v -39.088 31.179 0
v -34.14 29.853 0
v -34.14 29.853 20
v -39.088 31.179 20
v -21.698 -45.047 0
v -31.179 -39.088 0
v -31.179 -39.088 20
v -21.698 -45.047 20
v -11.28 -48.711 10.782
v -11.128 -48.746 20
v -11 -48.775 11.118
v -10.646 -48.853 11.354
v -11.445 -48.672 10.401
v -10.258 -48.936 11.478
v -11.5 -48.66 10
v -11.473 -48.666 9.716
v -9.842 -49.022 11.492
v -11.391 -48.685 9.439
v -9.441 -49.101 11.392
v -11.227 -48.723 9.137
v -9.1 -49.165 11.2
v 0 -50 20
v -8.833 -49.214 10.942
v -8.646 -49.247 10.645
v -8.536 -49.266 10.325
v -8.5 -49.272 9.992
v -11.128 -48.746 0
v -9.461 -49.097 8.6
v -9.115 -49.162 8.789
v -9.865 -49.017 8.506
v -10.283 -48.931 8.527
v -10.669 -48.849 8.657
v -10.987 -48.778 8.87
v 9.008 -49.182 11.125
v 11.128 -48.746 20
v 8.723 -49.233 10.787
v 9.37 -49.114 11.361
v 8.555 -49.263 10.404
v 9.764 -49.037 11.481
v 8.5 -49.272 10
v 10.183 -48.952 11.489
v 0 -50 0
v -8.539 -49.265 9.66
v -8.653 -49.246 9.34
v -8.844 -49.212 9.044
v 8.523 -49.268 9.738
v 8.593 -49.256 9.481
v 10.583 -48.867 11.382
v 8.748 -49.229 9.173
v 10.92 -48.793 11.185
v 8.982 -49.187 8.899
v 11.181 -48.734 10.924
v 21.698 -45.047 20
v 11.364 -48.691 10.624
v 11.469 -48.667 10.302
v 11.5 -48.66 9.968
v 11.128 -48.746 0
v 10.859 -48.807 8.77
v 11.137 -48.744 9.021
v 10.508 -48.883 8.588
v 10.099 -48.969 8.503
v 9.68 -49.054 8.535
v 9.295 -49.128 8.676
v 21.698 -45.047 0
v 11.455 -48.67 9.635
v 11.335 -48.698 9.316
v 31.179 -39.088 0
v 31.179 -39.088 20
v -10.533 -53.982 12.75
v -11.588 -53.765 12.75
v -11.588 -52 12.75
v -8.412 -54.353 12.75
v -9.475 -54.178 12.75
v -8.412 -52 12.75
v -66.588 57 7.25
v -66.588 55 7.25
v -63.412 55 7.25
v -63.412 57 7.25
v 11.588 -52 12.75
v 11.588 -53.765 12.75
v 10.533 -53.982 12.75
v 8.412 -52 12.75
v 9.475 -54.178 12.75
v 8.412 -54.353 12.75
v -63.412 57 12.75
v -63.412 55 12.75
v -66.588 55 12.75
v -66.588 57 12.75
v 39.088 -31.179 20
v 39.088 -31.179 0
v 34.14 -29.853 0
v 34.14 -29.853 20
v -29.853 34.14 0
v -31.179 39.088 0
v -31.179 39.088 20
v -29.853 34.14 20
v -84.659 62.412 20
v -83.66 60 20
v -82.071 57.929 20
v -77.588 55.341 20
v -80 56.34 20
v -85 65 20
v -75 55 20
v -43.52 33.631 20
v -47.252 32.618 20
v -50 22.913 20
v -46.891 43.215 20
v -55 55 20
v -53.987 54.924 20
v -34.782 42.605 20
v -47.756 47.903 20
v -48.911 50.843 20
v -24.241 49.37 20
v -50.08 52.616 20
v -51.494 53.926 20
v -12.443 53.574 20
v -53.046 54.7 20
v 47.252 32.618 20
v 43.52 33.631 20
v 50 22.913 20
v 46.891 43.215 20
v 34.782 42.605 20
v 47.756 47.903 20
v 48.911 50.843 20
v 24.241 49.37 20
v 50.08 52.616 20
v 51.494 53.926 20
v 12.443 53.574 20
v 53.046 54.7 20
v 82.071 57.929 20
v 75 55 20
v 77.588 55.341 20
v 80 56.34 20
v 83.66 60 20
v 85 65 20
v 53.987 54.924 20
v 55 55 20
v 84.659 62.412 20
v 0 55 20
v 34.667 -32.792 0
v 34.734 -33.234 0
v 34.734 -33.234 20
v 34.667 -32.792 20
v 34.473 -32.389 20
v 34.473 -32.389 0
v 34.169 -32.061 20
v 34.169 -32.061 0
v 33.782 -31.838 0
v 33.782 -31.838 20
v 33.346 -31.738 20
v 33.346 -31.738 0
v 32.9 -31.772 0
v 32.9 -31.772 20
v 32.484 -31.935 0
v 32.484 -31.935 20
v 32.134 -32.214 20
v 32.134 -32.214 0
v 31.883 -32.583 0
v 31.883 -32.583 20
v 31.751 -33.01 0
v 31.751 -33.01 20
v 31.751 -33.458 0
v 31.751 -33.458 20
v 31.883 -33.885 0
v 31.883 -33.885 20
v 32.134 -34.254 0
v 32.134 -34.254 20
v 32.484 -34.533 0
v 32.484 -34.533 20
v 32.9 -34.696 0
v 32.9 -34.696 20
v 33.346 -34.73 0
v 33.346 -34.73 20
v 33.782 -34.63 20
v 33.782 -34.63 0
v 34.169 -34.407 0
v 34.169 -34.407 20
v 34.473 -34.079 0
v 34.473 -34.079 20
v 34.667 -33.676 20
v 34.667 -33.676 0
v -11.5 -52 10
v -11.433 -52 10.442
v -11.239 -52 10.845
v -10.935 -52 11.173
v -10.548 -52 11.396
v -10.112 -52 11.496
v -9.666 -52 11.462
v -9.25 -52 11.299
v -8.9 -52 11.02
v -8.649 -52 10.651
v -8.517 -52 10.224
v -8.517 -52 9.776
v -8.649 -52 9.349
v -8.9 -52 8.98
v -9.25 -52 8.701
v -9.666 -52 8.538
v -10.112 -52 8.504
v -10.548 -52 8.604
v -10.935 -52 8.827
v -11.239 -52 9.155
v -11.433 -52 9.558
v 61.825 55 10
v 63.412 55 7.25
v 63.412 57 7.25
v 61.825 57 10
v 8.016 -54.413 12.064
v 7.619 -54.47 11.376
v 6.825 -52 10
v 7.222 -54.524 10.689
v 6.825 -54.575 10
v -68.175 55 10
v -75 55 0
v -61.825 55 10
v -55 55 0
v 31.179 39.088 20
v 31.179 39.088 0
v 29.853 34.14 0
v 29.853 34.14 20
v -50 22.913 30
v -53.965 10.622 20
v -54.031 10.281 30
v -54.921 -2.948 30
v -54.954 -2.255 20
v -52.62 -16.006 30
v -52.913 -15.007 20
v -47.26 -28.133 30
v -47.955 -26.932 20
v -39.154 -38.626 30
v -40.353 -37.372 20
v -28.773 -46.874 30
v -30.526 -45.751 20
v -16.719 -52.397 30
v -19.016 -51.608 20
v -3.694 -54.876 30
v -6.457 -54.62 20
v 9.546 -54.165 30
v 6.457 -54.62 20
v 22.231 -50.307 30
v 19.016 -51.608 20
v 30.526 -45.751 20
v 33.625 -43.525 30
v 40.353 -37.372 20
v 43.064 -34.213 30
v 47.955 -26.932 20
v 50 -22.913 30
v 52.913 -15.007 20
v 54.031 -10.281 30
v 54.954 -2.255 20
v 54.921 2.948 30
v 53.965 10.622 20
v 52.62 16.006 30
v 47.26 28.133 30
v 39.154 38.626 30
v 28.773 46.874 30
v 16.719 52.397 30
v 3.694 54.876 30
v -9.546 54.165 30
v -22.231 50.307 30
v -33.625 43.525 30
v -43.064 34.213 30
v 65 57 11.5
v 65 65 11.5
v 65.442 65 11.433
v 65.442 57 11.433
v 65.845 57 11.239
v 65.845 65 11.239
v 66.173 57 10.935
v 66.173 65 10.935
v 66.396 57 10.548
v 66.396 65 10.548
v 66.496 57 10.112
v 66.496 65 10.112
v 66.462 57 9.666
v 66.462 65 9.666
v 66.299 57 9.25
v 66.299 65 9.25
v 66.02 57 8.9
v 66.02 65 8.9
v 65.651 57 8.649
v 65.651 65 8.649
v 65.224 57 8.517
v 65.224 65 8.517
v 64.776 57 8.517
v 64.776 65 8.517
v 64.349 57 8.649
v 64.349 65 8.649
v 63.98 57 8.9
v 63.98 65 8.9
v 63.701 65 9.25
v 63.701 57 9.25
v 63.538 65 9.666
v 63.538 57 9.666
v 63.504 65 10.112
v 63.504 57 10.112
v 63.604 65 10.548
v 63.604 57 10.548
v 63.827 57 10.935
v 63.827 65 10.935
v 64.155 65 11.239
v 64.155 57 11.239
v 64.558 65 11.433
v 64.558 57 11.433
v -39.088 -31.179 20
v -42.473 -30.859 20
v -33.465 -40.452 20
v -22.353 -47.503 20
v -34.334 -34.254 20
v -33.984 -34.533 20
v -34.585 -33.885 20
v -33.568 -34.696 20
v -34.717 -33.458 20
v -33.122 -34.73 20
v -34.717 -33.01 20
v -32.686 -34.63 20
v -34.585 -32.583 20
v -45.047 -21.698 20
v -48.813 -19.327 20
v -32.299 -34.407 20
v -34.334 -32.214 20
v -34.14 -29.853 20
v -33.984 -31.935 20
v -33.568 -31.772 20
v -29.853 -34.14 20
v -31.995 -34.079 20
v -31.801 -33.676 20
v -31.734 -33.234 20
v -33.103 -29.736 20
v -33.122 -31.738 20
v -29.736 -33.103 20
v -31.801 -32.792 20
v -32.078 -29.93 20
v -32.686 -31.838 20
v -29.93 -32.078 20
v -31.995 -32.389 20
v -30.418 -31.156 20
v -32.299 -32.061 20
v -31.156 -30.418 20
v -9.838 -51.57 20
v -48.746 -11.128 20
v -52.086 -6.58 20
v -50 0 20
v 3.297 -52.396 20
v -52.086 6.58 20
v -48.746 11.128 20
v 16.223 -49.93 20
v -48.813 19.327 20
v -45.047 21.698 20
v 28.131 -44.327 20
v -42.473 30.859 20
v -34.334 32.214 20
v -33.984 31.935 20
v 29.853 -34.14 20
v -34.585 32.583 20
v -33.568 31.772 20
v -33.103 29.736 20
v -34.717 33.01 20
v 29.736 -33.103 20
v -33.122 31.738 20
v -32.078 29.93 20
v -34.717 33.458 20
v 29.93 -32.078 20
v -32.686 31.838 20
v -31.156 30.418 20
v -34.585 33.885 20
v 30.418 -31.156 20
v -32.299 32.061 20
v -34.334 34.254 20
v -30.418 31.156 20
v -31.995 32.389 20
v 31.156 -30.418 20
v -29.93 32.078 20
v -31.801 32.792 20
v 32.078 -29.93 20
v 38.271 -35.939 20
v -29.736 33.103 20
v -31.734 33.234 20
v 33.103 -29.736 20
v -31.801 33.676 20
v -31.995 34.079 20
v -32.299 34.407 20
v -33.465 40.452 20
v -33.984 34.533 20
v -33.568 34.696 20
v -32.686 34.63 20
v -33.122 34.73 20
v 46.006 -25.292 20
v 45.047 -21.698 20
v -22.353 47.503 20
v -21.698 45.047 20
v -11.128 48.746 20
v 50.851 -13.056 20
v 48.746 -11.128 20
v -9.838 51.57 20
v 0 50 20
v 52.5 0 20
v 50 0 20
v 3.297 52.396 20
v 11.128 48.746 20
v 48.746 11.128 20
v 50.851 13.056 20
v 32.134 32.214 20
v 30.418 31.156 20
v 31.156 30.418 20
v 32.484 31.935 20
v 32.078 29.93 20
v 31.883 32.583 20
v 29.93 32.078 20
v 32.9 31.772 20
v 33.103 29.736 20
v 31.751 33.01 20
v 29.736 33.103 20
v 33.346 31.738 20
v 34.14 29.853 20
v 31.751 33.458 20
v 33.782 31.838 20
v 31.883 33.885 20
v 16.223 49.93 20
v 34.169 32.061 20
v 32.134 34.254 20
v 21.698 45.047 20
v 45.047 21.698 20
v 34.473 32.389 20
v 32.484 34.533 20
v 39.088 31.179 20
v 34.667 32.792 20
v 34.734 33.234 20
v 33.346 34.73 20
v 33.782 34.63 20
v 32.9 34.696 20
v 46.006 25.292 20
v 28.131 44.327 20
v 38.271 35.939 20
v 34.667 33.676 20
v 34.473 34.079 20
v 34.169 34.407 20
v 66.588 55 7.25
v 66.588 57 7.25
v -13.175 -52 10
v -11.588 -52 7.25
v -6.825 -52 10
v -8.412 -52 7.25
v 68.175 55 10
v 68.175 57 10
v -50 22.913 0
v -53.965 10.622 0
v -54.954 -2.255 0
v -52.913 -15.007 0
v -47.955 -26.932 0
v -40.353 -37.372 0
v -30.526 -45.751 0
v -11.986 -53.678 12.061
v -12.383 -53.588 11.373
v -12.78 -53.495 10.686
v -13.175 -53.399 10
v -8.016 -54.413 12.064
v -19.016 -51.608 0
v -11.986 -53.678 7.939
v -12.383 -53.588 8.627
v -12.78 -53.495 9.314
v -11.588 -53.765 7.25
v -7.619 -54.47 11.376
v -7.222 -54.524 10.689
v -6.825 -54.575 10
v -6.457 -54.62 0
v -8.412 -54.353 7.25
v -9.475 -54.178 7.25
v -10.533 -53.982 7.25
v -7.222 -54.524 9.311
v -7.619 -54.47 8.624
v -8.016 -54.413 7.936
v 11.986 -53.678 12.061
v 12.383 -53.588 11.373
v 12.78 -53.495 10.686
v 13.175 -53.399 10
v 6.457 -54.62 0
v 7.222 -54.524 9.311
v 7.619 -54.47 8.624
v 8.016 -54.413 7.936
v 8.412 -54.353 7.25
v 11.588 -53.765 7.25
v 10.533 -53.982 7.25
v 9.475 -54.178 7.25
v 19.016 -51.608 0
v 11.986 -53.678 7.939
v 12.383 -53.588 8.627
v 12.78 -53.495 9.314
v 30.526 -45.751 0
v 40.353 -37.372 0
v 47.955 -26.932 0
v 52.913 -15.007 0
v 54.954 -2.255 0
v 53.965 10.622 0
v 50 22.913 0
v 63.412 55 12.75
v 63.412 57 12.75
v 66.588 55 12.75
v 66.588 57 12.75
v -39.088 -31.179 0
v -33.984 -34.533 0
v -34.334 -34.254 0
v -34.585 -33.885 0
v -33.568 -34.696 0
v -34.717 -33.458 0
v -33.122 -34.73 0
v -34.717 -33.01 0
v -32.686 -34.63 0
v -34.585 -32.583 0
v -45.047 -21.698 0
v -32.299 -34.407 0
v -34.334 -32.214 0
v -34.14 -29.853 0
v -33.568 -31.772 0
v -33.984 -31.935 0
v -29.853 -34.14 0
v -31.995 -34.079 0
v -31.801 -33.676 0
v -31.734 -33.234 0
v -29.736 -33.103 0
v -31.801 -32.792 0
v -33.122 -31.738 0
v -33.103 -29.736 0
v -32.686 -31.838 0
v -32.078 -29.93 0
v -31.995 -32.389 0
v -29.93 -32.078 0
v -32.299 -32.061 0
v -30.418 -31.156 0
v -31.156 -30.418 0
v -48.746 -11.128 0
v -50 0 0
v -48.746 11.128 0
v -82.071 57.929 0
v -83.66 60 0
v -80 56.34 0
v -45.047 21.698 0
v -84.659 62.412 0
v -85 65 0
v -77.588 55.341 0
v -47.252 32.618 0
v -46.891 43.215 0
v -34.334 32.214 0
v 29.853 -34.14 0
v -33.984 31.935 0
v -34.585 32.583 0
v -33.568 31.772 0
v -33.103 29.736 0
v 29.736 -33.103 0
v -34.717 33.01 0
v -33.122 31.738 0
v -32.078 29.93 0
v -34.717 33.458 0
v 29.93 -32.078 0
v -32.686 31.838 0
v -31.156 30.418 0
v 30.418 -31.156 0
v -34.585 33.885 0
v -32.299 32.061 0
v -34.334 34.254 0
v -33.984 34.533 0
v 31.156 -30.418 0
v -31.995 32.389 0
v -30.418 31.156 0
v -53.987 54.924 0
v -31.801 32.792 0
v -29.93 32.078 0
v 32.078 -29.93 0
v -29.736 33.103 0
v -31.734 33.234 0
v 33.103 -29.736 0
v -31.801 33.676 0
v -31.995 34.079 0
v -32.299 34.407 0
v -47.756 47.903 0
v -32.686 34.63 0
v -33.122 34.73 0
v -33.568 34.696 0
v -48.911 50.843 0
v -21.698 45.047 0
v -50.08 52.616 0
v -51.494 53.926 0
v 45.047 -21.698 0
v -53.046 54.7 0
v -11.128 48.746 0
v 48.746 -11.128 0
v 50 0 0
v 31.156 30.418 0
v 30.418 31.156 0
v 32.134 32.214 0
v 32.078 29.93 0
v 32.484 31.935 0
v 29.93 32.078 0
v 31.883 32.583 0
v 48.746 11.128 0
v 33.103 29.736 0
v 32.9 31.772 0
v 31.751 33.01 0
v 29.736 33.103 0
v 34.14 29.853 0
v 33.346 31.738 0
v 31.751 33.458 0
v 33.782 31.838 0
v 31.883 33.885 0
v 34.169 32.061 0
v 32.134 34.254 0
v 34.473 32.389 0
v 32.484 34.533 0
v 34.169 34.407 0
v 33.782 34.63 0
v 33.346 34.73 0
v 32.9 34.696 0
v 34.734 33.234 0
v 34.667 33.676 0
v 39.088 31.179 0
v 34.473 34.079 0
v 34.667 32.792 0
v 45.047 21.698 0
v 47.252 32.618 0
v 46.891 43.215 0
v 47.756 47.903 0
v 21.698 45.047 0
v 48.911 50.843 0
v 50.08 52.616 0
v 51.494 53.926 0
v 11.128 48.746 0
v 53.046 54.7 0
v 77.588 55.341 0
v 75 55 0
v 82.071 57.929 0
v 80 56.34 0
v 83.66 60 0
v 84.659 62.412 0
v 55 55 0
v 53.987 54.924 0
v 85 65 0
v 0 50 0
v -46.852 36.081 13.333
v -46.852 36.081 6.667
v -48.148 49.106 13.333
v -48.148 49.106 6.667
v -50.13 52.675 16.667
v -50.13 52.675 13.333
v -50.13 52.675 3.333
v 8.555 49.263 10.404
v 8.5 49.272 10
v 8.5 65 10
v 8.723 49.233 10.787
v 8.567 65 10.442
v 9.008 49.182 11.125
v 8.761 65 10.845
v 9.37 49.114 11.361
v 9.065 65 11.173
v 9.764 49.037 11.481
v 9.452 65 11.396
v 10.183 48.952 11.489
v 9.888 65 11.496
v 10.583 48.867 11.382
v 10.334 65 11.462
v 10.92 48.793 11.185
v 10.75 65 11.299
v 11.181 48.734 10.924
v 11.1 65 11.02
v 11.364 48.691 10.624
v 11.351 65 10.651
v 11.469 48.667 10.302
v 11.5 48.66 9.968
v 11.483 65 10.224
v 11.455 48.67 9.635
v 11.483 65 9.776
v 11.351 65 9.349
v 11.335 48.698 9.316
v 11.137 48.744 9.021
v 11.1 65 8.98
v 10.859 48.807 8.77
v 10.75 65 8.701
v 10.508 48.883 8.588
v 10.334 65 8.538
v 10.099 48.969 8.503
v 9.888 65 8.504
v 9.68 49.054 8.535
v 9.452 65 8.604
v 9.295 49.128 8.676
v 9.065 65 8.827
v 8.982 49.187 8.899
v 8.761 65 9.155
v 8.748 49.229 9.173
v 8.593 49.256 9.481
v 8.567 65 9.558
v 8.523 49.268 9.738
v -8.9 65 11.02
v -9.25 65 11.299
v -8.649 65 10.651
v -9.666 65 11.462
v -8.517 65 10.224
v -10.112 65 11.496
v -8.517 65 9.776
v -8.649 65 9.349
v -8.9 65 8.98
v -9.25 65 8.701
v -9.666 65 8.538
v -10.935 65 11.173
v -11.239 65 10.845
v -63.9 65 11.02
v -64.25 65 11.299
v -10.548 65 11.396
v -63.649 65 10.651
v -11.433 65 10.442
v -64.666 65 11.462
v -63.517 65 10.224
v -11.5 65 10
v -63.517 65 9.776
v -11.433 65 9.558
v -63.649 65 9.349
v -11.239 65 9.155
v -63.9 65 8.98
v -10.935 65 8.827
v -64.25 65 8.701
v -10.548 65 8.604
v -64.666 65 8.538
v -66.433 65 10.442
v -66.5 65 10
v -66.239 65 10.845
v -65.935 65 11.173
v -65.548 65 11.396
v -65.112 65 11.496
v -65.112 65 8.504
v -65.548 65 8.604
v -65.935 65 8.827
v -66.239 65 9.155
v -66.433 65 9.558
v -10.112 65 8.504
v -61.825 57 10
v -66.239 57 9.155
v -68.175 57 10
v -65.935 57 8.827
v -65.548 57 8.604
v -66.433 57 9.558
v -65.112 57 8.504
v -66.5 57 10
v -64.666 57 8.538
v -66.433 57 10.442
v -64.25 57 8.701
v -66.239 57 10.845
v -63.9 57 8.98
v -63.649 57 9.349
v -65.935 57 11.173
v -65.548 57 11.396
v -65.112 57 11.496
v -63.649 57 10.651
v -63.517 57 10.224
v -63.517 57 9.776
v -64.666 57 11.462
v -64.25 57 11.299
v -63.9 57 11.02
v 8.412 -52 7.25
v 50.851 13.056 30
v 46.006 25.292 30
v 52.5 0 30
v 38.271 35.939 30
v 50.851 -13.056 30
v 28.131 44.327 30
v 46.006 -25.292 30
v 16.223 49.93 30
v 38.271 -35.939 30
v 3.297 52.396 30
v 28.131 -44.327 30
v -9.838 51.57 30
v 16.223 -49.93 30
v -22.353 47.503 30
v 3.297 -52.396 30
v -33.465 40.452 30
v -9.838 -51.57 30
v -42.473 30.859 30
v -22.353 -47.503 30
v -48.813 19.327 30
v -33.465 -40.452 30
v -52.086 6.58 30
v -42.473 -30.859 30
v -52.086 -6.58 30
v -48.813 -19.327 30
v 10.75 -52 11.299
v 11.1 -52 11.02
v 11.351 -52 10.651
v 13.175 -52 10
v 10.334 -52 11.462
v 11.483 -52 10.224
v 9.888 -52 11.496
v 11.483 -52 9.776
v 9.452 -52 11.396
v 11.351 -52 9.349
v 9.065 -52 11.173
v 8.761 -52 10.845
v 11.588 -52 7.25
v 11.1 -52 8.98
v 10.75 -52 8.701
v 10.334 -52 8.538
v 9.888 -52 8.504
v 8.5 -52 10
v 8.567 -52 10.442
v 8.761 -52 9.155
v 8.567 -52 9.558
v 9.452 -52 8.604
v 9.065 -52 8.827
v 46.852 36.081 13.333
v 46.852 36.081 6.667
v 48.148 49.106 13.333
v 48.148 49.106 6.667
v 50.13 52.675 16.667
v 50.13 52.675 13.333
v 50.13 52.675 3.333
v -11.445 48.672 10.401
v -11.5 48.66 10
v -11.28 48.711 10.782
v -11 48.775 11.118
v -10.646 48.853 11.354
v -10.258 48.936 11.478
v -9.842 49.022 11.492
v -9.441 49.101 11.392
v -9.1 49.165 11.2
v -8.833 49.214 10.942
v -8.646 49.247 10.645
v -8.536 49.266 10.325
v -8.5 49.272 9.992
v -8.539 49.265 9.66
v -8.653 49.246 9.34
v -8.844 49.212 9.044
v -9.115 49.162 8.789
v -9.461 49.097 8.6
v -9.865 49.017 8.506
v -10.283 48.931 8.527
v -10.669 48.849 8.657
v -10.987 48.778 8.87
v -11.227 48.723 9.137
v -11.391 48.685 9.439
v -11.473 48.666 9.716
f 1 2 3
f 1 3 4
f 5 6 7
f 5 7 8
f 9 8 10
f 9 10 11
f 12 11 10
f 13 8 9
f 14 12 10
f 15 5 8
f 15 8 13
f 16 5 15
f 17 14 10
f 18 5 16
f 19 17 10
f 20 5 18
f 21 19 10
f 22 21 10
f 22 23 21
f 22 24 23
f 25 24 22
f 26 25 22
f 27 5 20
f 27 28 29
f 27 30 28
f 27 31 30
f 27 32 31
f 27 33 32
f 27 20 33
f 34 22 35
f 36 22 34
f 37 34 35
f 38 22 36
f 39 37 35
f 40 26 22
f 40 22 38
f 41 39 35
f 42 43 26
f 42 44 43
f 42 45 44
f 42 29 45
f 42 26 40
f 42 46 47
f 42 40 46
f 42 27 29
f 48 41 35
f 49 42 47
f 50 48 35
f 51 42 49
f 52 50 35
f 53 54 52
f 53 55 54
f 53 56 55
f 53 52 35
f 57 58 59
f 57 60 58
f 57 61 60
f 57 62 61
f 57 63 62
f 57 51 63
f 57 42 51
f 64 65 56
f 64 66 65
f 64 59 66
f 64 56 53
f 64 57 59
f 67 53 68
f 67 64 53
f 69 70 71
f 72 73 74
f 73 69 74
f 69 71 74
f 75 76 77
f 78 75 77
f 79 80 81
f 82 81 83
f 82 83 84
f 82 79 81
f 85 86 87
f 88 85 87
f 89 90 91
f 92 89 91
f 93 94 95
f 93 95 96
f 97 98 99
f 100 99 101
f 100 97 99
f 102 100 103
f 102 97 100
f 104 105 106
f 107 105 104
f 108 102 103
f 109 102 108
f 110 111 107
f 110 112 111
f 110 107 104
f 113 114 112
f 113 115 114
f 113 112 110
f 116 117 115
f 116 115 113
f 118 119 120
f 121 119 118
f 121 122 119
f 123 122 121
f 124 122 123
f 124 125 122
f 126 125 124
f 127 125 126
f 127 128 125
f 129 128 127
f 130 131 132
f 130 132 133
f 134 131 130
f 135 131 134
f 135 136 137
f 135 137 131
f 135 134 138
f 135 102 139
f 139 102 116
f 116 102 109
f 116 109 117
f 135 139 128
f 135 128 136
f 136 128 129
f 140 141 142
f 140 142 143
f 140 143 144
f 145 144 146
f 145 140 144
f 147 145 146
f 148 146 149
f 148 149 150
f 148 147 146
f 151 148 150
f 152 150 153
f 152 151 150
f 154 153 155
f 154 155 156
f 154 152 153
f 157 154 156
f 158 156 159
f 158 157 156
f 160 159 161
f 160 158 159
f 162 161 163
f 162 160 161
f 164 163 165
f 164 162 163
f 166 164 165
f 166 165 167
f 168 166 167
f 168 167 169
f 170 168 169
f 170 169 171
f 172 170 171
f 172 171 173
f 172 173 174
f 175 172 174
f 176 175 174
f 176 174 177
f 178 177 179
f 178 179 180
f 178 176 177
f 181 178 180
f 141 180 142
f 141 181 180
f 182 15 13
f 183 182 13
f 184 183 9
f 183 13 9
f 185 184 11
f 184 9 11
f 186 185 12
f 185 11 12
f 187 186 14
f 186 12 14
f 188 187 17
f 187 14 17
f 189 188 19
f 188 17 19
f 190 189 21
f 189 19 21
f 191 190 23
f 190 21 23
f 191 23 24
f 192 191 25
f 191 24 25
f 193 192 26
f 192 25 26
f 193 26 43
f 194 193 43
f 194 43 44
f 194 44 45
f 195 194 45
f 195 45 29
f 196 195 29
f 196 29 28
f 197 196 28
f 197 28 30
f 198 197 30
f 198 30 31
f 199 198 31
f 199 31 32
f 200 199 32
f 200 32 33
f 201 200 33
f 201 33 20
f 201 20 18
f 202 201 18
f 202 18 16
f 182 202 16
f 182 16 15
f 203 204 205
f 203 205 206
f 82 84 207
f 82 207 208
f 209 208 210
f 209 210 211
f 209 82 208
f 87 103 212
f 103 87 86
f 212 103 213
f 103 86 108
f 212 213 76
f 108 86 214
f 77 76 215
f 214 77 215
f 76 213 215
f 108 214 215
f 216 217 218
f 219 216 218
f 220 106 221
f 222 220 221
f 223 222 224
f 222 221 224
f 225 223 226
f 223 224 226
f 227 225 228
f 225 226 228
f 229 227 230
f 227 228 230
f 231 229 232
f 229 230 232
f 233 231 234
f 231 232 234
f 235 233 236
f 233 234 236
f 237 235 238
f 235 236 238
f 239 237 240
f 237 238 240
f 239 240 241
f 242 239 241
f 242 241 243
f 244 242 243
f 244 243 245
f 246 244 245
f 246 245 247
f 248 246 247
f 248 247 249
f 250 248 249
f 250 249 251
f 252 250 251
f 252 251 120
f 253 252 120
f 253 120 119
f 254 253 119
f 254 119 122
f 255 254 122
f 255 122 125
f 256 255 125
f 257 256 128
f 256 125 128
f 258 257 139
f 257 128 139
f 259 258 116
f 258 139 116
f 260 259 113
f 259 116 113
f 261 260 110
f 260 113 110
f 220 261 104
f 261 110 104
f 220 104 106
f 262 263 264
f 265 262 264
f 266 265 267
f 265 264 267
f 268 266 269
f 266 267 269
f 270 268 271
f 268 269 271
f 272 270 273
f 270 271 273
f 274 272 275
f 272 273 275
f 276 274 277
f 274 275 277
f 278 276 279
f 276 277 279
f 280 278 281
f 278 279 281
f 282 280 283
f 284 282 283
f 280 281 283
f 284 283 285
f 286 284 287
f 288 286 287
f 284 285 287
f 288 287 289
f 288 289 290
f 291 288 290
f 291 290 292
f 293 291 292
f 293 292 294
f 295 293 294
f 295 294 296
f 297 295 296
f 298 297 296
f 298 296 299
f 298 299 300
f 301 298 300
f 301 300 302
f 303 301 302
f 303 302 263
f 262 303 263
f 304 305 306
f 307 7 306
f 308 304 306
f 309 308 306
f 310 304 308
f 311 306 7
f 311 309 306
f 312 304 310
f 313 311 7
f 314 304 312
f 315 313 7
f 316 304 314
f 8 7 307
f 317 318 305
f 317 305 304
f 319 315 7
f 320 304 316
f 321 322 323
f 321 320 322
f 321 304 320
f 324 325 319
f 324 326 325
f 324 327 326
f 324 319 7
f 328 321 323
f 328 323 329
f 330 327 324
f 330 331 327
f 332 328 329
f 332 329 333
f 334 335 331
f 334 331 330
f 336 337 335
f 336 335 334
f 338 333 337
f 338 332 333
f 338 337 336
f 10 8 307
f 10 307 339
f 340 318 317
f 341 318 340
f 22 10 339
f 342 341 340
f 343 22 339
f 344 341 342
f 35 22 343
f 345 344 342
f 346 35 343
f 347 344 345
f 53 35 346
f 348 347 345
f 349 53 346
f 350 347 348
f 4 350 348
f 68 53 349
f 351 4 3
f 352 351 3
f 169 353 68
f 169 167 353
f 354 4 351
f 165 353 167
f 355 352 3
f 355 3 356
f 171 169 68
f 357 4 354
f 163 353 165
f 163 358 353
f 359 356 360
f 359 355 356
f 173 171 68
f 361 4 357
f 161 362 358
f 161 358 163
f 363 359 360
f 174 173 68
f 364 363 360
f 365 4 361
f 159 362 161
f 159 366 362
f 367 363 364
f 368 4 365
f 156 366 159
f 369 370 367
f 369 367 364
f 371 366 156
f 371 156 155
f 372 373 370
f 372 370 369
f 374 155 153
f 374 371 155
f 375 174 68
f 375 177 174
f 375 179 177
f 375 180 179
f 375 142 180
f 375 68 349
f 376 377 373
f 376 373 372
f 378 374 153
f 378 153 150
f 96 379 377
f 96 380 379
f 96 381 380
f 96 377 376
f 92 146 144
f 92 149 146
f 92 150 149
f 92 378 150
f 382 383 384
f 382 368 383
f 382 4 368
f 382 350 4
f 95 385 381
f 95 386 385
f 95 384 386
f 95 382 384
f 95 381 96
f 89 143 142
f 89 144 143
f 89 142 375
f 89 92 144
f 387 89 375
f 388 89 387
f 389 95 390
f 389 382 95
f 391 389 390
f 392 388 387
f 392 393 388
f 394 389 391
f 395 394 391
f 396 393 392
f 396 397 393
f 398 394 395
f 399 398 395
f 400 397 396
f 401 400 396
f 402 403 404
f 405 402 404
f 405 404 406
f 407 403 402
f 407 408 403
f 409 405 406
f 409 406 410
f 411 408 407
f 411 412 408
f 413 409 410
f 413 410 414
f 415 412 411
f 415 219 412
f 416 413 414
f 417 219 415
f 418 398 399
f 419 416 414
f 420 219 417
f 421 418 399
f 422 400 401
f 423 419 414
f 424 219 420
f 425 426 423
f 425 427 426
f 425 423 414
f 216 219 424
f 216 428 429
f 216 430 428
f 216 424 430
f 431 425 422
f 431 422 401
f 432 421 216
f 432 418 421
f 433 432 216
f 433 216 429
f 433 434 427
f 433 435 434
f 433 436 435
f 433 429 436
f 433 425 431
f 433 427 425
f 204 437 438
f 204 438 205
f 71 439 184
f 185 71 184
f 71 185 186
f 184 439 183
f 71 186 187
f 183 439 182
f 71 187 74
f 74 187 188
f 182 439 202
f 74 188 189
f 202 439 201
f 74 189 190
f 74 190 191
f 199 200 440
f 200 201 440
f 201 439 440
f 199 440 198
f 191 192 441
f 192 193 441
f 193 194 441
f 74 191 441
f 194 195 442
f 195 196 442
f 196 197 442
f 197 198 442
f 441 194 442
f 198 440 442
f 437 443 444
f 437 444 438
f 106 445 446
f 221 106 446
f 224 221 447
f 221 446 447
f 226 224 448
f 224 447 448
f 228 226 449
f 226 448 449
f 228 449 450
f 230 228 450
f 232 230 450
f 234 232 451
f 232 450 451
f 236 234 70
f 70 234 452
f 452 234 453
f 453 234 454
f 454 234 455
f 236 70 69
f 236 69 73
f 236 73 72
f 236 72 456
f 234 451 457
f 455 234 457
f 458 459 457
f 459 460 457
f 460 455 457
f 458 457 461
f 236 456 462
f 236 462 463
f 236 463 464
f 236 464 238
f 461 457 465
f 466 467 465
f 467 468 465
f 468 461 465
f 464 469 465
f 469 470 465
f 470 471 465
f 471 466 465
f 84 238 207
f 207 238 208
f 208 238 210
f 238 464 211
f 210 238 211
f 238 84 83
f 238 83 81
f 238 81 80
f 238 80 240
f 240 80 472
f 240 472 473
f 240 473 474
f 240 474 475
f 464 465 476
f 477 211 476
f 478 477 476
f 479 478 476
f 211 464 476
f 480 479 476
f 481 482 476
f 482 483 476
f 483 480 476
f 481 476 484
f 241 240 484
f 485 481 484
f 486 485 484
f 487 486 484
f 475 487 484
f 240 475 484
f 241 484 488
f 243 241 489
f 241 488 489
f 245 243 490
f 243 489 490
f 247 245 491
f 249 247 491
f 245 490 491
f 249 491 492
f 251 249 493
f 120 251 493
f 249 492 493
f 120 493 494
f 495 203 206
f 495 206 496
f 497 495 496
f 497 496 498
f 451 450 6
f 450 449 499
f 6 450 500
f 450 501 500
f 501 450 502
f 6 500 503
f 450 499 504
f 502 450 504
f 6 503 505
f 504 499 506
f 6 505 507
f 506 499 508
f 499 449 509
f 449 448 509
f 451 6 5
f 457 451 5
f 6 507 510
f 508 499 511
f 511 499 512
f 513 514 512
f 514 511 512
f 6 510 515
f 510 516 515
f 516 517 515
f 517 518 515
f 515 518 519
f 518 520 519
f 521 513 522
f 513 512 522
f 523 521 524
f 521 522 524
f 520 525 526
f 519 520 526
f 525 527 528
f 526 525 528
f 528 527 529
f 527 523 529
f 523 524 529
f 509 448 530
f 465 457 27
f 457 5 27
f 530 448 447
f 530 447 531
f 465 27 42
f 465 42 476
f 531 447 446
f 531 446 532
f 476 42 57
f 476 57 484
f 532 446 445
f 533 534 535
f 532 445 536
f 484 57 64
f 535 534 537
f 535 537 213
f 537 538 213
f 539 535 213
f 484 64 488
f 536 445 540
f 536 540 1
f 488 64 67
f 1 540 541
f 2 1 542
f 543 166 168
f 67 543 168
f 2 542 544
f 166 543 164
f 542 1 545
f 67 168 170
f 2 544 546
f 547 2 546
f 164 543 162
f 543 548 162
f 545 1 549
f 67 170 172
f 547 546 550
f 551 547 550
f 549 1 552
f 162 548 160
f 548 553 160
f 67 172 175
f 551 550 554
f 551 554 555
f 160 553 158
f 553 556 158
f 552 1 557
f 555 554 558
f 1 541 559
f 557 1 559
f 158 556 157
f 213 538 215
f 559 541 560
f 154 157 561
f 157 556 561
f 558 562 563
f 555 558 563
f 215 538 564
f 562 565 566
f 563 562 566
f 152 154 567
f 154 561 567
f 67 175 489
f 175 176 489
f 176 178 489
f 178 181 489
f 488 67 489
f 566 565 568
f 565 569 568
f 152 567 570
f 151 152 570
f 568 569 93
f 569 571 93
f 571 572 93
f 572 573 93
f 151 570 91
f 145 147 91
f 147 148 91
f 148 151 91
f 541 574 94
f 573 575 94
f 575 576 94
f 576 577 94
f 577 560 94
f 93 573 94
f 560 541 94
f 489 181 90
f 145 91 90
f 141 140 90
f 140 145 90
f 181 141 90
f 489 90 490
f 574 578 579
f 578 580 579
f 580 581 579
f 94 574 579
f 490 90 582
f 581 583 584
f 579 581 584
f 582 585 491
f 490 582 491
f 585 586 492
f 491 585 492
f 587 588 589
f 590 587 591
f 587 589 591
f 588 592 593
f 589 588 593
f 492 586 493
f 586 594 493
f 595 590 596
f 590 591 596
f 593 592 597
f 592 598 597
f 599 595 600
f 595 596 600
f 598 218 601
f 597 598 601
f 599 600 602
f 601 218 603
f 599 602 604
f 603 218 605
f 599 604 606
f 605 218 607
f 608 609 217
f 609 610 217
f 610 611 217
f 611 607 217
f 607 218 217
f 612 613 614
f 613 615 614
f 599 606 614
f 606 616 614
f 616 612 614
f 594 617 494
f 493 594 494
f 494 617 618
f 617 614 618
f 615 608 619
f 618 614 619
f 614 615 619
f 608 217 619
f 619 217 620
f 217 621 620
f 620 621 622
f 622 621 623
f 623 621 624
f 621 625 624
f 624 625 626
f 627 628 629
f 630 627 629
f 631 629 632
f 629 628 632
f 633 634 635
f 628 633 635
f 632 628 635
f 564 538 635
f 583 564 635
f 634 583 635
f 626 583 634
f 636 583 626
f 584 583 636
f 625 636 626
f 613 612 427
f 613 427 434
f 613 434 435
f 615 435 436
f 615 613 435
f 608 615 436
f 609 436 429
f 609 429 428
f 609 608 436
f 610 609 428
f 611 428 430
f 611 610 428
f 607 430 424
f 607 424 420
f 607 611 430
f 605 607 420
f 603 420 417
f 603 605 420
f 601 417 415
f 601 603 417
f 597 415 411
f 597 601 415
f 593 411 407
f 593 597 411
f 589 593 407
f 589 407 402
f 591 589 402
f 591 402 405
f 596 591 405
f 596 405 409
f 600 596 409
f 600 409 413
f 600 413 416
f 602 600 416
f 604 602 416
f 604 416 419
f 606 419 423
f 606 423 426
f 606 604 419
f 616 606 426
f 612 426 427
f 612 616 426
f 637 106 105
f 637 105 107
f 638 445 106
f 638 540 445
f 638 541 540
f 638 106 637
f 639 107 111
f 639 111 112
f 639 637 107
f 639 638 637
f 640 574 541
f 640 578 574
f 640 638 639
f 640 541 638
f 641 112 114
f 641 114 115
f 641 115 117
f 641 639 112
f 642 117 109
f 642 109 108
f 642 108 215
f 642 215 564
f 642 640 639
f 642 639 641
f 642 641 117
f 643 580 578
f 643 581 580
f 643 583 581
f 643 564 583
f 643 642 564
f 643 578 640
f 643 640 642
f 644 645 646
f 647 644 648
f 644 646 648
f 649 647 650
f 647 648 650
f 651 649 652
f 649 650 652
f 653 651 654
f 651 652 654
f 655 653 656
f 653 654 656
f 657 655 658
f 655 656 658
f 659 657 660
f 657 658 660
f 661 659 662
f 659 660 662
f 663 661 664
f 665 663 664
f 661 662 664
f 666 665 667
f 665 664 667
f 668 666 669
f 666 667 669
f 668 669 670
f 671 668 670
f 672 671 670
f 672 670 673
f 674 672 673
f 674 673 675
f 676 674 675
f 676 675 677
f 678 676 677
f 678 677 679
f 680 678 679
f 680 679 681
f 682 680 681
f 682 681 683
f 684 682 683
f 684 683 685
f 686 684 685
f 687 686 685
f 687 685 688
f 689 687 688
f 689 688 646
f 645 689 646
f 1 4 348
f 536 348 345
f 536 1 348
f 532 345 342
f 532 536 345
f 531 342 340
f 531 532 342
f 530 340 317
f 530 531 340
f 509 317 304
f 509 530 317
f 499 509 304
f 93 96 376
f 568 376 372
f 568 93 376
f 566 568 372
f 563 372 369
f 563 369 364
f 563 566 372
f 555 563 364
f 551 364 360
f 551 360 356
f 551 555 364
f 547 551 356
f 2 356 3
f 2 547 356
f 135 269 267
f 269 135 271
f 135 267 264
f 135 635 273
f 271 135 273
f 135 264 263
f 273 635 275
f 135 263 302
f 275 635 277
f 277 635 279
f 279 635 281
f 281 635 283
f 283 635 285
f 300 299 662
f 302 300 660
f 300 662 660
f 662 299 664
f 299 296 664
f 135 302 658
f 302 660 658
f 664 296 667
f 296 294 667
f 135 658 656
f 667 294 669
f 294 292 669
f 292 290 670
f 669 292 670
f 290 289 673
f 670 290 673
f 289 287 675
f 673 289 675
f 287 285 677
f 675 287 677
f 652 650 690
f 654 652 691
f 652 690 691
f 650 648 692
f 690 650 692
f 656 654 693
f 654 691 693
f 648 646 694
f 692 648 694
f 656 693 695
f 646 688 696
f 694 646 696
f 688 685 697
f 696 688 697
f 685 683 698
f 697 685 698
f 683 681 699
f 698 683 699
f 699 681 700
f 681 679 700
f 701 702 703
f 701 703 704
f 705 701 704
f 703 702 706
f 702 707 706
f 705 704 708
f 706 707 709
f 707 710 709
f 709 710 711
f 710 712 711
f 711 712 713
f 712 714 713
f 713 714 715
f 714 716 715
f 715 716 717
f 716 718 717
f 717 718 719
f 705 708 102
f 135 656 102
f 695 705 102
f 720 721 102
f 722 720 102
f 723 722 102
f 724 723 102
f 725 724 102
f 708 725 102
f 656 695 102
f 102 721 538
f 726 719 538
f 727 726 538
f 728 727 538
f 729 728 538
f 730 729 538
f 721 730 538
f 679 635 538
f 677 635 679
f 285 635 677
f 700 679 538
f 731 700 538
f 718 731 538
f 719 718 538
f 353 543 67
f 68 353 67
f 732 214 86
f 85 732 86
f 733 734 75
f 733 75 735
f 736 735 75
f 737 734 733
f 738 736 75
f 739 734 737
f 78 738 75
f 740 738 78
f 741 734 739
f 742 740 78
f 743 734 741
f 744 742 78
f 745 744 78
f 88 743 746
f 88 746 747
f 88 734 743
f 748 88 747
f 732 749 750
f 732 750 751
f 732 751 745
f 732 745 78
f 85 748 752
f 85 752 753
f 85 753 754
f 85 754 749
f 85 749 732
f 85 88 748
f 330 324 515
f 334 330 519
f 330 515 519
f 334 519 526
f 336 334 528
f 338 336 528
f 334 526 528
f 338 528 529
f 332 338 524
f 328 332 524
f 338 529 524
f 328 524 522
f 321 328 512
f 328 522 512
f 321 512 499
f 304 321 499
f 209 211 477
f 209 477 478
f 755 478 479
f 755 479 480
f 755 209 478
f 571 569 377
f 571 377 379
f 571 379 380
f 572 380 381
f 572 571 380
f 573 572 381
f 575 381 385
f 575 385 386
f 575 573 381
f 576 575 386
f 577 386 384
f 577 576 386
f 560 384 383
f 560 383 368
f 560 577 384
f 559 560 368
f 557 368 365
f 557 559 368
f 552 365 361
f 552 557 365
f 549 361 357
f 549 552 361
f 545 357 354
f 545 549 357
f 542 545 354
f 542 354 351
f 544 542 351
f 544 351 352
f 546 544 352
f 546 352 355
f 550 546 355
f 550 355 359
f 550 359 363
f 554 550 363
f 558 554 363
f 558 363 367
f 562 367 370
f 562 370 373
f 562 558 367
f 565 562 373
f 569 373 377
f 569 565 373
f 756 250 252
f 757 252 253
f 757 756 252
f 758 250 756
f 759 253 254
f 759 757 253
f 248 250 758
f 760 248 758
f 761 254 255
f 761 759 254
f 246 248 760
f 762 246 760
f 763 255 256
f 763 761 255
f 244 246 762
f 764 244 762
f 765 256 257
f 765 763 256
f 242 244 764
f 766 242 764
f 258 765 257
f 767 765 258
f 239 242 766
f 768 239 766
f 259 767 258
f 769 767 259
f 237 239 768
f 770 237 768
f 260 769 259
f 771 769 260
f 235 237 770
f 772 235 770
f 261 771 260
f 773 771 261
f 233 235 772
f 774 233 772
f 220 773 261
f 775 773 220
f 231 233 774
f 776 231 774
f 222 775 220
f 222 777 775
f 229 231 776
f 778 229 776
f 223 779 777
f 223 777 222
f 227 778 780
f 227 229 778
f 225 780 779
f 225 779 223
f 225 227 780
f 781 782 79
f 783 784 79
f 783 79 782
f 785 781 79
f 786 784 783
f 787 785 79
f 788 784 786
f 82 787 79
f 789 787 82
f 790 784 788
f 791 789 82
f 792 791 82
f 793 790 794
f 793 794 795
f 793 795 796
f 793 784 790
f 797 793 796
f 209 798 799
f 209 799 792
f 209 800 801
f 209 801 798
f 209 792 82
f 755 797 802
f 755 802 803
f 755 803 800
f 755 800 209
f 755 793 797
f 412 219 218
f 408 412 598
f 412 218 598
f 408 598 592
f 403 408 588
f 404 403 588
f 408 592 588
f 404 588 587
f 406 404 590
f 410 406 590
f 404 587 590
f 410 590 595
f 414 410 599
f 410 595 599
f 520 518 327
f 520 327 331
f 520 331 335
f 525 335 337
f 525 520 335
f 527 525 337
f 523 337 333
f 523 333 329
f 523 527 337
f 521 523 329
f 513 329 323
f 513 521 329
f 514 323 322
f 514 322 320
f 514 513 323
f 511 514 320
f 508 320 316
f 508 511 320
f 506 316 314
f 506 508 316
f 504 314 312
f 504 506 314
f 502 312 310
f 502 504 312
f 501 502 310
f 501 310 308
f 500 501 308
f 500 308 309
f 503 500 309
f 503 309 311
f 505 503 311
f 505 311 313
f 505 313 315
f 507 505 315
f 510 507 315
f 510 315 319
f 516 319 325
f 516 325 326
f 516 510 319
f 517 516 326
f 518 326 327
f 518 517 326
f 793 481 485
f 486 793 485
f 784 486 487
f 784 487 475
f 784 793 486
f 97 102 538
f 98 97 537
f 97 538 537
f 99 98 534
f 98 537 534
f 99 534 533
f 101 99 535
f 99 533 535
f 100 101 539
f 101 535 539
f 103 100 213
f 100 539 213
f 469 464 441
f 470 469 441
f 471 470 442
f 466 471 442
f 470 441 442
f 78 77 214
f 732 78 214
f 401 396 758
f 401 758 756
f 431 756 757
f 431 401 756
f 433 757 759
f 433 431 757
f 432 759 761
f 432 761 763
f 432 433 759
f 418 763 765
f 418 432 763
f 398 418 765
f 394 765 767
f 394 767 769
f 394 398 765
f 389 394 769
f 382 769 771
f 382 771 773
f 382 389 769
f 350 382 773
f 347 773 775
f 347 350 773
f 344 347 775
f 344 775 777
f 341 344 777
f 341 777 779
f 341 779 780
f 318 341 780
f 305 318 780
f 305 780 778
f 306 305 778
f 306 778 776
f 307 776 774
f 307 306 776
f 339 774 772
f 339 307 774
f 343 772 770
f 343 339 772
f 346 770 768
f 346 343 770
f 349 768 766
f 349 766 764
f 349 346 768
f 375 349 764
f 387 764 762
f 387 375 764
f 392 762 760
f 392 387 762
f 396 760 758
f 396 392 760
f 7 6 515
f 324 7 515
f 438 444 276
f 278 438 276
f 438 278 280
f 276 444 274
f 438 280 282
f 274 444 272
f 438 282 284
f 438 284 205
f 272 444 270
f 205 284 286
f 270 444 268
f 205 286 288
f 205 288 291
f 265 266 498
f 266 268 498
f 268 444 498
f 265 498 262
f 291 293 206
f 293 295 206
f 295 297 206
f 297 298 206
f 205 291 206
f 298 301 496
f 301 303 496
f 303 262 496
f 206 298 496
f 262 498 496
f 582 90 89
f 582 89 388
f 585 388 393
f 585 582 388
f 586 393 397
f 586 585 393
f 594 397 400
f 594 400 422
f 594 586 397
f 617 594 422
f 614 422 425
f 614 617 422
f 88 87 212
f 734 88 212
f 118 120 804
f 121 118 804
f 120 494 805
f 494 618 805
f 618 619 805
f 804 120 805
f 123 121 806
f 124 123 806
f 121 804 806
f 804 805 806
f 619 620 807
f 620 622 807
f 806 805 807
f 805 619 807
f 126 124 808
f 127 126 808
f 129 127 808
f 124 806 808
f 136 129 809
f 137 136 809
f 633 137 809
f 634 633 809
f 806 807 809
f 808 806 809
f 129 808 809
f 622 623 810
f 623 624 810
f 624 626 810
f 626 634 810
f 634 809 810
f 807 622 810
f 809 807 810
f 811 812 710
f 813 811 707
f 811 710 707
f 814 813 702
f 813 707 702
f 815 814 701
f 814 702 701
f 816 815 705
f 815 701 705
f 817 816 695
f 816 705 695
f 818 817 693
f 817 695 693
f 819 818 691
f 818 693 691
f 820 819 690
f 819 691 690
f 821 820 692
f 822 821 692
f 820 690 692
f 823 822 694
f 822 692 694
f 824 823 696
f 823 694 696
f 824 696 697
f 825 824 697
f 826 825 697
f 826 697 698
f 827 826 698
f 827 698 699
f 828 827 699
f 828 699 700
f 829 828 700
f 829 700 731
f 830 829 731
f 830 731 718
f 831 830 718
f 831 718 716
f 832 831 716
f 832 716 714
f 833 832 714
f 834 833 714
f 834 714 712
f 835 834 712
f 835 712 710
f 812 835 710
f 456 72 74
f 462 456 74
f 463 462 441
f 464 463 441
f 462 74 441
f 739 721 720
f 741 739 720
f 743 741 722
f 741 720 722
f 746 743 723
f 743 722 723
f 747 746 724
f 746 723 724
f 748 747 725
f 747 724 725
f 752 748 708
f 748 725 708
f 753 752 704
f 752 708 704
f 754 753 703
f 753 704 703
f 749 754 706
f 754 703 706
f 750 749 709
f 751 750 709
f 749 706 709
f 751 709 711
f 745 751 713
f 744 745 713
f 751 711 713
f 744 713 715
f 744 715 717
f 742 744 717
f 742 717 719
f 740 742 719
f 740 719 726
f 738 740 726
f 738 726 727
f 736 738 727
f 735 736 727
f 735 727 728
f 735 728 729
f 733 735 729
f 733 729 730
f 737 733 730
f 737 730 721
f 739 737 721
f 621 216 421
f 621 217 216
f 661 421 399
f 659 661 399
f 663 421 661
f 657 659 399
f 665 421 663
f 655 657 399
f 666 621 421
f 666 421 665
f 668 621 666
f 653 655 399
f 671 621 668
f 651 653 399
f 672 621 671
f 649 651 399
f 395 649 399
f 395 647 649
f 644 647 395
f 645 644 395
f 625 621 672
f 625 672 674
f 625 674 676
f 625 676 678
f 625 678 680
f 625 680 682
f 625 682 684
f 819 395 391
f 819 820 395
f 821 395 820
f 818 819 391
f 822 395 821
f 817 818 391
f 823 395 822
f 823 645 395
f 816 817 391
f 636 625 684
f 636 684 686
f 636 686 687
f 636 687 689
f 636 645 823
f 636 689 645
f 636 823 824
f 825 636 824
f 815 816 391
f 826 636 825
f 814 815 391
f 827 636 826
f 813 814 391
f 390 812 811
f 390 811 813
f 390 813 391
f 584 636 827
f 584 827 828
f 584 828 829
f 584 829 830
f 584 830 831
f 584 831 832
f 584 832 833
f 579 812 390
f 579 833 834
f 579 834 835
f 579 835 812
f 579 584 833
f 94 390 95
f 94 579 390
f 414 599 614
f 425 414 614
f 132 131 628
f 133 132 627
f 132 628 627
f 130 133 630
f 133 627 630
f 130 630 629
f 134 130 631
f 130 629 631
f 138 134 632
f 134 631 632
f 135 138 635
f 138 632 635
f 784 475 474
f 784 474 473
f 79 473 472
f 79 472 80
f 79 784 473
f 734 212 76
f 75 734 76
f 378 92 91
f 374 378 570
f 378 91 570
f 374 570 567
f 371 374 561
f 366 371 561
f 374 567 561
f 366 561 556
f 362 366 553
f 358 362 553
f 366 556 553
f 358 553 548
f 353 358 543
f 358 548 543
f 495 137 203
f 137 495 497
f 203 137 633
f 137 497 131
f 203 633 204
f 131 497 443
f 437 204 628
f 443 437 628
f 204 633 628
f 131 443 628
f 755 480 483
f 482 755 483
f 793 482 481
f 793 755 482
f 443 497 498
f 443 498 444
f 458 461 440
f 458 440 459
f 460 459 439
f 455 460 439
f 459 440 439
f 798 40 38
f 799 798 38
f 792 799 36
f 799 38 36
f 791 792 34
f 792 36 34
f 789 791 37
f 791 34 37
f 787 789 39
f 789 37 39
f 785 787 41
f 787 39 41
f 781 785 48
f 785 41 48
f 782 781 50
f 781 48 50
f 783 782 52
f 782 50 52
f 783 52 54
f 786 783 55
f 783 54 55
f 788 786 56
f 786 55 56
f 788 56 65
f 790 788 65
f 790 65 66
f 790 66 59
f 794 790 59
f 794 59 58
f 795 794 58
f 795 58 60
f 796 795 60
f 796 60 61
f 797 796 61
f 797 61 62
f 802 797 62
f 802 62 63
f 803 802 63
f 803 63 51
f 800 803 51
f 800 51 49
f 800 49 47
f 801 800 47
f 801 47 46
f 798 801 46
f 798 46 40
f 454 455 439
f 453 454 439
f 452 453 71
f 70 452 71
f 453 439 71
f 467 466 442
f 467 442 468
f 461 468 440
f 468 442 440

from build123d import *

# Parameters (mm, degrees)
SKETCH_2_R          = 50
EXTRUDE_1_DEPTH     = 20
SKETCH_3_R          = 1.5
CUT_EXTRUDE_1_DEPTH = 149.408220948
SKETCH_4_R          = 1.5
EXTRUDE_2_DEPTH     = 20
CUT_EXTRUDE_START   = -52
CUT_EXTRUDE_4_DEPTH = 57.857705442
CUT_EXTRUDE_5_DEPTH = 2
SKETCH_9_R          = 55
SKETCH_9_R_2        = 50
EXTRUDE_3_DEPTH     = 10
CUT_EXTRUDE_START_2 = -10
SKETCH_10_R         = 52.5
SKETCH_10_R_2       = 50
CUT_EXTRUDE_6_DEPTH = 10


with BuildPart() as part:
    # 草图2 → 凸台-拉伸1 (new body)
    with BuildSketch(Plane.XY):
        with BuildLine():
            Line((-75, 55), (-55, 55))
            add(Edge.make_bspline(
                [(-50, 22.912878475), (-45, 33.823772987), (-45, 55), (-55, 55)],
                knots=[0, 0, 0, 0, 1, 1, 1, 1], degree=3))
            ThreePointArc((-50, 22.912878475), (0, -55), (50, 22.912878475))
            add(Edge.make_bspline(
                [(50, 22.912878475), (45, 33.823772987), (45, 55), (55, 55)],
                knots=[0, 0, 0, 0, 1, 1, 1, 1], degree=3))
            Line((55, 55), (75, 55))
            ThreePointArc((75, 55), (82.071067812, 57.928932188), (85, 65))
            Line((85, 65), (-85, 65))
            ThreePointArc((-85, 65), (-82.071067812, 57.928932188), (-75, 55))
        make_face()
        Circle(SKETCH_2_R, mode=Mode.SUBTRACT)
    extrude(amount=EXTRUDE_1_DEPTH)

    # 草图3 → 切除-拉伸1 (cut, through all)
    with BuildSketch(Plane(origin=(0, 65, 0), x_dir=(1, 0, 0), z_dir=(0, 1, 0))):
        with Locations(Location((-65, -10, 0), (0, 0, 180))):
            Circle(SKETCH_3_R)
        with Locations(Location((-10, -10, 0), (0, 0, 180))):
            Circle(SKETCH_3_R)
        with Locations(Location((10, -10, 0), (0, 0, 180))):
            Circle(SKETCH_3_R)
        with Locations(Location((65, -10, 0), (0, 0, 270))):
            Circle(SKETCH_3_R)
    extrude(amount=-CUT_EXTRUDE_1_DEPTH, mode=Mode.SUBTRACT)

    # 草图4 → 凸台-拉伸2 (add, through all)
    # profile 1 of 4: a face of its own
    with BuildSketch(Plane.XY):
        with BuildLine():
            Line((-31.179095181, 39.087901245), (-29.853278324, 34.139885374))
            ThreePointArc((-29.853278324, 34.139885374), (-30.759144982, 30.759144982), (-34.139885374, 29.853278324))
            Line((-34.139885374, 29.853278324), (-39.087901245, 31.179095181))
            ThreePointArc((-39.087901245, 31.179095181), (-35.355339059, 35.355339059), (-31.179095181, 39.087901245))
        make_face()
        with Locations((-33.234018716, 33.234018716)):
            Circle(SKETCH_4_R, mode=Mode.SUBTRACT)
    # profile 2 of 4: a face of its own
    with BuildSketch(Plane.XY):
        with BuildLine():
            Line((31.179095181, 39.087901245), (29.853278324, 34.139885374))
            ThreePointArc((29.853278324, 34.139885374), (30.759144982, 30.759144982), (34.139885374, 29.853278324))
            Line((34.139885374, 29.853278324), (39.087901245, 31.179095181))
            ThreePointArc((39.087901245, 31.179095181), (35.355339059, 35.355339059), (31.179095181, 39.087901245))
        make_face()
        with Locations((33.234018716, 33.234018716)):
            Circle(SKETCH_4_R, mode=Mode.SUBTRACT)
    # profile 3 of 4: a face of its own
    with BuildSketch(Plane.XY):
        with BuildLine():
            Line((39.087901245, -31.179095181), (34.139885374, -29.853278324))
            ThreePointArc((34.139885374, -29.853278324), (30.759144982, -30.759144982), (29.853278324, -34.139885374))
            Line((29.853278324, -34.139885374), (31.179095181, -39.087901245))
            ThreePointArc((31.179095181, -39.087901245), (35.355339059, -35.355339059), (39.087901245, -31.179095181))
        make_face()
        with Locations((33.234018716, -33.234018716)):
            Circle(SKETCH_4_R, mode=Mode.SUBTRACT)
    # profile 4 of 4: a face of its own
    with BuildSketch(Plane.XY):
        with BuildLine():
            Line((-31.179095181, -39.087901245), (-29.853278324, -34.139885374))
            ThreePointArc((-29.853278324, -34.139885374), (-30.759144982, -30.759144982), (-34.139885374, -29.853278324))
            Line((-34.139885374, -29.853278324), (-39.087901245, -31.179095181))
            ThreePointArc((-39.087901245, -31.179095181), (-35.355339059, -35.355339059), (-31.179095181, -39.087901245))
        make_face()
        with Locations((-33.234018716, -33.234018716)):
            Circle(SKETCH_4_R, mode=Mode.SUBTRACT)
    extrude(amount=EXTRUDE_2_DEPTH)

    # 草图6 → 切除-拉伸4 (cut, through all)
    with BuildSketch(Plane(origin=(0, 0, 0), x_dir=(1, 0, 0), z_dir=(0, 1, 0)).offset(CUT_EXTRUDE_START)):
        Polygon((-8.41228676, -7.25), (-11.58771324, -7.25), (-13.175426481, -10), (-11.58771324, -12.75), (-8.41228676, -12.75), (-6.824573519, -10), align=None)
        Polygon((6.824573519, -10), (8.41228676, -7.25), (11.58771324, -7.25), (13.175426481, -10), (11.58771324, -12.75), (8.41228676, -12.75), align=None)
    extrude(amount=-CUT_EXTRUDE_4_DEPTH, mode=Mode.SUBTRACT)

    # 草图7 → 切除-拉伸5 (cut)
    with BuildSketch(Plane.XZ.offset(-55)):
        Polygon((-63.41228676, 12.75), (-66.58771324, 12.75), (-68.175426481, 10), (-66.58771324, 7.25), (-63.41228676, 7.25), (-61.824573519, 10), align=None)
        Polygon((61.824573519, 10), (63.41228676, 12.75), (66.58771324, 12.75), (68.175426481, 10), (66.58771324, 7.25), (63.41228676, 7.25), align=None)
    extrude(amount=-CUT_EXTRUDE_5_DEPTH, mode=Mode.SUBTRACT)

    # 草图9 → 凸台-拉伸3 (add)
    with BuildSketch(Plane.XY.offset(20)):
        with Locations(Location((0, 0, 0), (0, 0, 155.380022671))):
            Circle(SKETCH_9_R)
        with Locations(Location((0, 0, 0), (0, 0, 218.578178478))):
            Circle(SKETCH_9_R_2, mode=Mode.SUBTRACT)
    extrude(amount=EXTRUDE_3_DEPTH)

    # 草图10 → 切除-拉伸6 (cut)
    with BuildSketch(Plane.XY.offset(30).offset(CUT_EXTRUDE_START_2)):
        Circle(SKETCH_10_R)
        Circle(SKETCH_10_R_2, mode=Mode.SUBTRACT)
    extrude(amount=CUT_EXTRUDE_6_DEPTH, mode=Mode.SUBTRACT)


solid = part.part
